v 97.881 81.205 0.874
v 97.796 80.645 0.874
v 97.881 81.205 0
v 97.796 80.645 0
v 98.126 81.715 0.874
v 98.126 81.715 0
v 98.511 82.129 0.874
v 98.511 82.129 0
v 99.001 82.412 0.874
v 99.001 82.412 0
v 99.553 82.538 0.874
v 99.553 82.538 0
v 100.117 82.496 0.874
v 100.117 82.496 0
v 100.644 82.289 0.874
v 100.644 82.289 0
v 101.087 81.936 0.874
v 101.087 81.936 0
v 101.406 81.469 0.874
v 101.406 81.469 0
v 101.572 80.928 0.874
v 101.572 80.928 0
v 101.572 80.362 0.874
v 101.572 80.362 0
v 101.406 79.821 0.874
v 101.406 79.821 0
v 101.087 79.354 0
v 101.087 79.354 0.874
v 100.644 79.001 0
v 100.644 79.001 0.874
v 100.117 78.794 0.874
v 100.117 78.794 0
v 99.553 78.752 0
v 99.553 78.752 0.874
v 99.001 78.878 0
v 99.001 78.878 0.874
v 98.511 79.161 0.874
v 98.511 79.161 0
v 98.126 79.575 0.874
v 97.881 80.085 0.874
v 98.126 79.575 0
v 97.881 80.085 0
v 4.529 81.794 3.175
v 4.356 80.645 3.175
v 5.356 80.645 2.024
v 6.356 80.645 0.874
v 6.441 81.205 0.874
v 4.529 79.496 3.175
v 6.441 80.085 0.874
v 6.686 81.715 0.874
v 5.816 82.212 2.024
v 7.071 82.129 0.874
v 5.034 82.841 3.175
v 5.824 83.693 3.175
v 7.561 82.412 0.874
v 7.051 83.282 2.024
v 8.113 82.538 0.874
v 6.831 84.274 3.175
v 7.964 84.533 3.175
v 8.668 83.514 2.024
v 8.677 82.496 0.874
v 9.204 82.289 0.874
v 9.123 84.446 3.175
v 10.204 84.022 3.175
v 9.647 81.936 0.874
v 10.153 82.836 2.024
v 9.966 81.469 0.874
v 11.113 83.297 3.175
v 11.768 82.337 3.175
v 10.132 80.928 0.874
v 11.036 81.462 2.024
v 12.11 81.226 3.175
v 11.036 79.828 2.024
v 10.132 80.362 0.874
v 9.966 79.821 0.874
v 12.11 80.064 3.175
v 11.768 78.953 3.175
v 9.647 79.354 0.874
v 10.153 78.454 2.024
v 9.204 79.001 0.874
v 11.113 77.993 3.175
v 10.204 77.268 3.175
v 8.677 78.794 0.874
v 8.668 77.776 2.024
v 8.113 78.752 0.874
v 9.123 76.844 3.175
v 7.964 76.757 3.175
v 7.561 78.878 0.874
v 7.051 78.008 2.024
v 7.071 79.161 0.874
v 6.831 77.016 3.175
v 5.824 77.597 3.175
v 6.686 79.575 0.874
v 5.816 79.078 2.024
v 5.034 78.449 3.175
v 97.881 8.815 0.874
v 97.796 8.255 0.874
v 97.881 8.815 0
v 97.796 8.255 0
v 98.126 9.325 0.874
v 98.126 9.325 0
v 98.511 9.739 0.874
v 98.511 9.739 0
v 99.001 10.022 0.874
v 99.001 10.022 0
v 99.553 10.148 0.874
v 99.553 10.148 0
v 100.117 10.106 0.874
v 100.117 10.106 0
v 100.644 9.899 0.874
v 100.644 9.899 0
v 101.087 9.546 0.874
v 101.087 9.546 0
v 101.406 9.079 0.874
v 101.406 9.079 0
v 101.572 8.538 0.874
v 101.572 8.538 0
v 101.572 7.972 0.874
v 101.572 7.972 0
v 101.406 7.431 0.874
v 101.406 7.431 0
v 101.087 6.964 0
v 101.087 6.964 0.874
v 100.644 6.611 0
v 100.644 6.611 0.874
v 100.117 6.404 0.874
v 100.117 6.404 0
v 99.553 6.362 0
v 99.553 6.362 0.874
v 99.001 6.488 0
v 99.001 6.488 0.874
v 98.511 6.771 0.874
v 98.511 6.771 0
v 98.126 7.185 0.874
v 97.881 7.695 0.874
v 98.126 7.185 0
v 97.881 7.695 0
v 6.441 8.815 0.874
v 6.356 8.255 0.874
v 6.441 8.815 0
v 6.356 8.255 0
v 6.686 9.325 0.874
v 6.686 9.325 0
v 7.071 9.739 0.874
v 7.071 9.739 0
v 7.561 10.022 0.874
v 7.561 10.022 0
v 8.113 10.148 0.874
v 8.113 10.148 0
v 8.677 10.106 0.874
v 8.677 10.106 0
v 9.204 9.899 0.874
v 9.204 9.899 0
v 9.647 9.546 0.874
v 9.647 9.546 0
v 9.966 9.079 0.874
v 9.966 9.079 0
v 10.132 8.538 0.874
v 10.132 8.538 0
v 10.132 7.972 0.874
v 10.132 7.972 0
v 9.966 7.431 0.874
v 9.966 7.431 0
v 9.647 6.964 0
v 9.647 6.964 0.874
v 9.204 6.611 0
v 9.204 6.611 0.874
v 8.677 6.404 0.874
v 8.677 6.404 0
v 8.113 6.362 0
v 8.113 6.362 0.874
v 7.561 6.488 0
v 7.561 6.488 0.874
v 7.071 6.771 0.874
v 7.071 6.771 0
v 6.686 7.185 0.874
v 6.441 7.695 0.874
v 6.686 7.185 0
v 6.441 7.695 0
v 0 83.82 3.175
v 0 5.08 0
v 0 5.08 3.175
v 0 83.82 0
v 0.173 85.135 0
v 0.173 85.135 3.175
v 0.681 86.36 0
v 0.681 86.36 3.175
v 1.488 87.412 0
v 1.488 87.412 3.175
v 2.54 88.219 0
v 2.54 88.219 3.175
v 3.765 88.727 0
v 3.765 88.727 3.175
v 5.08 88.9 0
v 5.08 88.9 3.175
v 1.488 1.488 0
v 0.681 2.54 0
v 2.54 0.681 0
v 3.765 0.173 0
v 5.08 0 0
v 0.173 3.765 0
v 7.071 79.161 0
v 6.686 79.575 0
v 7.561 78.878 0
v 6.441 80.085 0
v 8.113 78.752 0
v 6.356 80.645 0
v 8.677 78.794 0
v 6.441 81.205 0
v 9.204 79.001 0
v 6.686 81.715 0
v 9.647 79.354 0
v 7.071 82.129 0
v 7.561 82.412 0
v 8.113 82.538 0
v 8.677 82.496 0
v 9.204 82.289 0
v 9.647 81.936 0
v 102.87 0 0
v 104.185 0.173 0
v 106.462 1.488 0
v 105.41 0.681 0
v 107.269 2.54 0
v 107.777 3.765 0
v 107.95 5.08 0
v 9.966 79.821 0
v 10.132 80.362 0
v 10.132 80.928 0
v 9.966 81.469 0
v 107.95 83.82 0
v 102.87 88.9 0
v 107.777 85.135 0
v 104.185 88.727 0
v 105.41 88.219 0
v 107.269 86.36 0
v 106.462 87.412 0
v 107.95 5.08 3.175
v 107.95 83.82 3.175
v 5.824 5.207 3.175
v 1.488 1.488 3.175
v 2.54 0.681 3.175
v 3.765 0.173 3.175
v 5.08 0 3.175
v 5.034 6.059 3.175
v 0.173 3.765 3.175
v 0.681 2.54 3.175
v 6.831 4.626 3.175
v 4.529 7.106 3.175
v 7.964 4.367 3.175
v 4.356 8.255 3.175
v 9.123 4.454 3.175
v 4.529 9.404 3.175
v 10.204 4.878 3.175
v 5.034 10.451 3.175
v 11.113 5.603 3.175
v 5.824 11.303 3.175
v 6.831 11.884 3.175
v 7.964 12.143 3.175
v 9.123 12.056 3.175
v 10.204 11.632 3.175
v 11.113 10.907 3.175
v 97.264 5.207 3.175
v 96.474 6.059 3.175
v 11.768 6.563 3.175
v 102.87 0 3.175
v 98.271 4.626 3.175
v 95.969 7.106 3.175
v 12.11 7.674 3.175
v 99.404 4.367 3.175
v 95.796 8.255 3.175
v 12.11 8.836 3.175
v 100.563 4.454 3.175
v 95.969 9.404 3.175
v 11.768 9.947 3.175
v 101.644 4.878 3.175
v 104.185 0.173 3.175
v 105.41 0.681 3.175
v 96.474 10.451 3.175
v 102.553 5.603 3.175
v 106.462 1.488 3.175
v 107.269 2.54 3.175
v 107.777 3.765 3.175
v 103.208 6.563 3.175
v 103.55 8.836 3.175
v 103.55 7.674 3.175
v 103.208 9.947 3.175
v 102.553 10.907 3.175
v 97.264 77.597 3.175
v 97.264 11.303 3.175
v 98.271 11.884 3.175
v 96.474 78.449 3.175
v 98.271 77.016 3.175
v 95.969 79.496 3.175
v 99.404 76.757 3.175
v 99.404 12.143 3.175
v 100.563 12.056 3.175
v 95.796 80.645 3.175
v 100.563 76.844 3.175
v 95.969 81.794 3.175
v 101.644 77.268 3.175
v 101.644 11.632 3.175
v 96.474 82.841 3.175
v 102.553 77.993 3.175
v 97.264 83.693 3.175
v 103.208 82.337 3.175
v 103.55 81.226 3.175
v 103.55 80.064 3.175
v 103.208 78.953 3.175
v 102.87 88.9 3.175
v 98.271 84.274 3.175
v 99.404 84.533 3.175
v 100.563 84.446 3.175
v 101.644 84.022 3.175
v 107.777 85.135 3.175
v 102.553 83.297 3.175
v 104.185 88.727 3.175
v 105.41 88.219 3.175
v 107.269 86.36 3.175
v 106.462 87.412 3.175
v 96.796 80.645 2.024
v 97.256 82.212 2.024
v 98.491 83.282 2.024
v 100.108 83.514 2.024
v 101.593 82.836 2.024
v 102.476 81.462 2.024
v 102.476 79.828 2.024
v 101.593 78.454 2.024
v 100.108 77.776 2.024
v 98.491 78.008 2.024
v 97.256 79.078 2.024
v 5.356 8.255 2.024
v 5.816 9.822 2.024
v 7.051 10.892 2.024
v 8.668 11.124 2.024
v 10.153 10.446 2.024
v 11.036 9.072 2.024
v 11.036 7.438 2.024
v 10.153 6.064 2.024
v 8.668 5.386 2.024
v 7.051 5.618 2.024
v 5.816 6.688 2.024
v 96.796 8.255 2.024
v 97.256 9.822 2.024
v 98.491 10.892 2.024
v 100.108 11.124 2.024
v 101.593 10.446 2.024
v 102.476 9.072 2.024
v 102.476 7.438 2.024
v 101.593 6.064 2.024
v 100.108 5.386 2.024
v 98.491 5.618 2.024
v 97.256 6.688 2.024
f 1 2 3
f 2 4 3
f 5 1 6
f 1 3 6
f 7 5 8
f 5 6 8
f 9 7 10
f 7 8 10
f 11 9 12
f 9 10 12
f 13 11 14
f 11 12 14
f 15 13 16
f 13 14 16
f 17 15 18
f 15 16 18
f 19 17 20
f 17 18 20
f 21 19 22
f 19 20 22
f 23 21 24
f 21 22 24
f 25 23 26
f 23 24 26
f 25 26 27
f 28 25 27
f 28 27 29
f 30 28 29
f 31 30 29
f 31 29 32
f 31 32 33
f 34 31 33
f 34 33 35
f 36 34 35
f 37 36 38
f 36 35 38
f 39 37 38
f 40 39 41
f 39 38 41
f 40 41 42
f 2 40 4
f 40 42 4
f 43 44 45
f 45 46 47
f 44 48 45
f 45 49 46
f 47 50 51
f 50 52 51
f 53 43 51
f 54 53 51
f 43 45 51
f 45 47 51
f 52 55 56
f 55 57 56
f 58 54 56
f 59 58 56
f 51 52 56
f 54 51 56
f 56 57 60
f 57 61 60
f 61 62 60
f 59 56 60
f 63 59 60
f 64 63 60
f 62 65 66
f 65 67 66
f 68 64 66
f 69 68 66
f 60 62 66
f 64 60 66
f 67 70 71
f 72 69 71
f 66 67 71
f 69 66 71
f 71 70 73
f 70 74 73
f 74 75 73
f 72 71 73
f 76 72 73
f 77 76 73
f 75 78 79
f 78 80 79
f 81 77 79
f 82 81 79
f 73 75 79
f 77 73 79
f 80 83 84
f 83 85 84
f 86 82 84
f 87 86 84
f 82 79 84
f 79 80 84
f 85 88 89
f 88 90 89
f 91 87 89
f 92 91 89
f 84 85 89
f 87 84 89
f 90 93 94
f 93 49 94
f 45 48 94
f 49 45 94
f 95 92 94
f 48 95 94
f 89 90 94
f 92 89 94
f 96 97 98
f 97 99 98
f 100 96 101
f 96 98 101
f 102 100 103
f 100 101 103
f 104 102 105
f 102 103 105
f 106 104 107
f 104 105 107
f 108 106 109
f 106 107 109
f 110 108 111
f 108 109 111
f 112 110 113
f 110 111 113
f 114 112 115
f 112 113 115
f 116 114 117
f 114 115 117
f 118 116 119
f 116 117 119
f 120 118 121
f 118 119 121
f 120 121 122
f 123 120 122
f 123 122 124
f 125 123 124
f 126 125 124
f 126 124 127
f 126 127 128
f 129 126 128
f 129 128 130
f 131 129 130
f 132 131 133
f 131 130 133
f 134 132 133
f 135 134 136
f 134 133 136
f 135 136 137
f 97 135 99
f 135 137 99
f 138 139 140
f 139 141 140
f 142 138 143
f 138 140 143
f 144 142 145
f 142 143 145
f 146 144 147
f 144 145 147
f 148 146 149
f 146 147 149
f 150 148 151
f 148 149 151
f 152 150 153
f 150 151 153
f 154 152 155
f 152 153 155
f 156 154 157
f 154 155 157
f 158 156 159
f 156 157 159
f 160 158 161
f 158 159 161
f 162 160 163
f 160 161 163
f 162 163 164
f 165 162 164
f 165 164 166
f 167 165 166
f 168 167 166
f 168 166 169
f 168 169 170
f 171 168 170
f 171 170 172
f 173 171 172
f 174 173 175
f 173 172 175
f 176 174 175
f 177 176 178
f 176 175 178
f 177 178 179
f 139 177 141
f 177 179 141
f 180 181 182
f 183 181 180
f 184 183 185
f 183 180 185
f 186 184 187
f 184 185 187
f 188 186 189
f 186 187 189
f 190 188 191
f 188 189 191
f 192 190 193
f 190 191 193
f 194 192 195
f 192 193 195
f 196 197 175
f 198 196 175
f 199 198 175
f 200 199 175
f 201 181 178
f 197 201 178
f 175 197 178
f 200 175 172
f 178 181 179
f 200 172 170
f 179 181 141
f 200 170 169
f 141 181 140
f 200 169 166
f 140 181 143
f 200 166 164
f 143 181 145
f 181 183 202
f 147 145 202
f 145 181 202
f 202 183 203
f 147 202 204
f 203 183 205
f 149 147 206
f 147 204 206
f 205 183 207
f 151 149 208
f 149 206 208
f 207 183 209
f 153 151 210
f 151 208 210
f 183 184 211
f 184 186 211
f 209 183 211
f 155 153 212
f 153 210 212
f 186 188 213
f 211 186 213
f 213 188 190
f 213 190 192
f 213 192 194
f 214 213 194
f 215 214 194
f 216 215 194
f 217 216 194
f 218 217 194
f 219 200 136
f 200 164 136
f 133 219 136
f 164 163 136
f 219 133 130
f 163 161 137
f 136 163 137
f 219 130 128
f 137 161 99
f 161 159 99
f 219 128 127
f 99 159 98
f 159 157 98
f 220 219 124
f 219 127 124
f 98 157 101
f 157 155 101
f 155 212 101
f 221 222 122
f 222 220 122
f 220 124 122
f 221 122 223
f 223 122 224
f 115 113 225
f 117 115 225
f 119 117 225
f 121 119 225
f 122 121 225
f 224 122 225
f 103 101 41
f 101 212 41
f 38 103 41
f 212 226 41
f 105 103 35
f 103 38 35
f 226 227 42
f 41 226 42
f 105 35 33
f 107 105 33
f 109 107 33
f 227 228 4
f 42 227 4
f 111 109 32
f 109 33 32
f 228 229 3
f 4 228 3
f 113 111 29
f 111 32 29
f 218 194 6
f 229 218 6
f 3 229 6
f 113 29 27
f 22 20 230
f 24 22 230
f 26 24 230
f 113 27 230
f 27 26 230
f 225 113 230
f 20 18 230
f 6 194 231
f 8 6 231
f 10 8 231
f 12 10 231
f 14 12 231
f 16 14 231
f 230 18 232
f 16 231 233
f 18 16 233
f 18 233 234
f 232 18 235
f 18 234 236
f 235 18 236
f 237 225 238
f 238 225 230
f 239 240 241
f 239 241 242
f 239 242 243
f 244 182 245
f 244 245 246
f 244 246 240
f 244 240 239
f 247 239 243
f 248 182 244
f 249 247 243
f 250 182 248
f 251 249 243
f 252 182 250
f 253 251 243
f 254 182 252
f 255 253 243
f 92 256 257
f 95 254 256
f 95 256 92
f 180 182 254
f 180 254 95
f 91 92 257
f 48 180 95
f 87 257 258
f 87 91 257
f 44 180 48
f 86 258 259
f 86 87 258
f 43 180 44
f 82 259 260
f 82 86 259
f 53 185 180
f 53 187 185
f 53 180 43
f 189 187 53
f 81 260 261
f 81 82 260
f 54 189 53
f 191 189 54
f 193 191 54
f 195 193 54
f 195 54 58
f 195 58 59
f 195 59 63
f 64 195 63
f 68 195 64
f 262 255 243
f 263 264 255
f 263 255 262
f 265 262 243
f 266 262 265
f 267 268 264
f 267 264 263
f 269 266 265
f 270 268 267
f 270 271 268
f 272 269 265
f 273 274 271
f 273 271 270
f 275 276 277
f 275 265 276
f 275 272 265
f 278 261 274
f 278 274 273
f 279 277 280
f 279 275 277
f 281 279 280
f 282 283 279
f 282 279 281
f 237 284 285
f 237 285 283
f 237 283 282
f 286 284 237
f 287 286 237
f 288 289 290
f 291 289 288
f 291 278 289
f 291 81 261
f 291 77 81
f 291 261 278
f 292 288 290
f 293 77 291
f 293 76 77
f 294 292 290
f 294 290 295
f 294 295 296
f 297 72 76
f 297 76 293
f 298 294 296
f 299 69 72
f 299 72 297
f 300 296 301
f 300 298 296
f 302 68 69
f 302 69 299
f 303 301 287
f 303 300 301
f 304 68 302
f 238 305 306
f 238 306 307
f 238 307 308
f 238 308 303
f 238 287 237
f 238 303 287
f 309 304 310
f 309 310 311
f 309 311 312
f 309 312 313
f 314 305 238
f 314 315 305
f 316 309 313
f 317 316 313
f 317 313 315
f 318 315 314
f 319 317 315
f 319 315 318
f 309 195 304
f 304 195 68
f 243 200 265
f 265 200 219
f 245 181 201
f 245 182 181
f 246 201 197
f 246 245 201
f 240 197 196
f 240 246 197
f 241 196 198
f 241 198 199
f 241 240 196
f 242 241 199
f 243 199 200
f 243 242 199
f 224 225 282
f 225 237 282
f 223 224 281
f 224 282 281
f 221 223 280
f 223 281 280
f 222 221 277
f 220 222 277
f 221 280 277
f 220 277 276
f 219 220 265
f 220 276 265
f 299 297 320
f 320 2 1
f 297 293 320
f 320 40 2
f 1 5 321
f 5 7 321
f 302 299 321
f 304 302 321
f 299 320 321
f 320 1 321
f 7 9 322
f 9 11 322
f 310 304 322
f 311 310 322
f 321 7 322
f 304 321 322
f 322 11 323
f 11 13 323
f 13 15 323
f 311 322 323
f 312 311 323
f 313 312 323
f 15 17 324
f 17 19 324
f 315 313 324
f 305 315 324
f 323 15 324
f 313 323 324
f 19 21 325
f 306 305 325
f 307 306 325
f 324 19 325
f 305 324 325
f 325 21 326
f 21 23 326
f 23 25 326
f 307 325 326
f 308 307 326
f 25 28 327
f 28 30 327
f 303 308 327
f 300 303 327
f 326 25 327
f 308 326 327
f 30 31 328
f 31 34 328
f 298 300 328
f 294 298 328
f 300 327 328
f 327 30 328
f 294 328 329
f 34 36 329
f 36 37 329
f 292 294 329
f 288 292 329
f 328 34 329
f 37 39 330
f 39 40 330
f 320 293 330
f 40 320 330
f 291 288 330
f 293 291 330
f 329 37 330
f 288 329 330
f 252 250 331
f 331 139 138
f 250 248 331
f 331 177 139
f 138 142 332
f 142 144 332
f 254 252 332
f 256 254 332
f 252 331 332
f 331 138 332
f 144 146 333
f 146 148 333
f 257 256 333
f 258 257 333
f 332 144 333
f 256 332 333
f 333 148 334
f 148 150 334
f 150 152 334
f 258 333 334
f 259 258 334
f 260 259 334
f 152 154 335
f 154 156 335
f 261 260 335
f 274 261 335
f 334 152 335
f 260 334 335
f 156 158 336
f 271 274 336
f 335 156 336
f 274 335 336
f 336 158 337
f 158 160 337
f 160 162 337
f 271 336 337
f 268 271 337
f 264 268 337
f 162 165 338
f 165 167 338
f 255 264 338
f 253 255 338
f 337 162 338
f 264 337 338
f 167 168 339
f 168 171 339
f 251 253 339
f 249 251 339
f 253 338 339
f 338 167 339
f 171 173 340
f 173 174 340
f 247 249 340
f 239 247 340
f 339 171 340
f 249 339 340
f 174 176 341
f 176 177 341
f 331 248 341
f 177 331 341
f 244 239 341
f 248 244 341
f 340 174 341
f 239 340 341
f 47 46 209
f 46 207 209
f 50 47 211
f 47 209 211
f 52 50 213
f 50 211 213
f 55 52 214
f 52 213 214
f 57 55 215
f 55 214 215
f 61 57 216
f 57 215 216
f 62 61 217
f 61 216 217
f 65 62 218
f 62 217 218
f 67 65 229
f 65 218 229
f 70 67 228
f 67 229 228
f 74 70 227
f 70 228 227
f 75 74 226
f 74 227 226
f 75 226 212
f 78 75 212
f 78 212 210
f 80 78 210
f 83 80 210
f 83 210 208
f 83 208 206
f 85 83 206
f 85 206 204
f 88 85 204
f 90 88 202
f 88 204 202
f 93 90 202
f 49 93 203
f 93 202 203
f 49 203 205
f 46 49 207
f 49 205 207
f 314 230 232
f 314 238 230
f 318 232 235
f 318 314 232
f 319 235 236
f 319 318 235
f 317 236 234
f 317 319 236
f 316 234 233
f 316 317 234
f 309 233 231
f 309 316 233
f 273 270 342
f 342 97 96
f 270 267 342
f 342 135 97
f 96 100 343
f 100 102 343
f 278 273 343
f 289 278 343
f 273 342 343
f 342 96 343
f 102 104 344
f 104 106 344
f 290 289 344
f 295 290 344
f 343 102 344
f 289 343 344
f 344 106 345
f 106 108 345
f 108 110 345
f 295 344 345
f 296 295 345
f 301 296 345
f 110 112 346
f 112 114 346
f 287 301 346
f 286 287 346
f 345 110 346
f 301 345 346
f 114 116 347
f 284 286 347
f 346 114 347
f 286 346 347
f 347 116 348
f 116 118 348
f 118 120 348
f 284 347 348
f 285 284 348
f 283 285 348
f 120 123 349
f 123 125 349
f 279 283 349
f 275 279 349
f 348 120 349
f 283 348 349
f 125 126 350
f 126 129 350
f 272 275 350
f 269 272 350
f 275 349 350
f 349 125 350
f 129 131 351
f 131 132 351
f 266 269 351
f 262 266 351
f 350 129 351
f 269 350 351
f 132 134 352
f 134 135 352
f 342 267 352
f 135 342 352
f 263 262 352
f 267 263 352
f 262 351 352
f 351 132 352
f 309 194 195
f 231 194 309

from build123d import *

# Parameters (mm, degrees)
F0_W           = 107.95
F0_H           = 88.9
F1_DEPTH       = 3.175
F3_D           = 3.7973
F3_CSINK_D     = 7.7978
F3_CSINK_ANGLE = 82
F4_R           = 5.08


with BuildPart() as f1:
    # F0 (on Top) → F1 (new body)
    with BuildSketch(Plane.XY):
        with Locations((53.975, 44.45)):
            Rectangle(F0_W, F0_H)
    extrude(amount=F1_DEPTH)

    # F3 (through all)
    with Locations(Plane.XY.offset(3.175)):
        with Locations((8.255, 80.645), (99.695, 80.645), (99.695, 8.255), (8.255, 8.255)):
            CounterSinkHole(F3_D / 2, F3_CSINK_D / 2, counter_sink_angle=F3_CSINK_ANGLE)

    # F4
    f4_edges = [f1.edges().sort_by_distance(p)[0] for p in [
        (0, 0, 1.5875),
        (107.95, 0, 1.5875),
        (107.95, 88.9, 1.5875),
        (0, 88.9, 1.5875),
    ]]
    fillet(f4_edges, radius=F4_R)


solid = f1.part
